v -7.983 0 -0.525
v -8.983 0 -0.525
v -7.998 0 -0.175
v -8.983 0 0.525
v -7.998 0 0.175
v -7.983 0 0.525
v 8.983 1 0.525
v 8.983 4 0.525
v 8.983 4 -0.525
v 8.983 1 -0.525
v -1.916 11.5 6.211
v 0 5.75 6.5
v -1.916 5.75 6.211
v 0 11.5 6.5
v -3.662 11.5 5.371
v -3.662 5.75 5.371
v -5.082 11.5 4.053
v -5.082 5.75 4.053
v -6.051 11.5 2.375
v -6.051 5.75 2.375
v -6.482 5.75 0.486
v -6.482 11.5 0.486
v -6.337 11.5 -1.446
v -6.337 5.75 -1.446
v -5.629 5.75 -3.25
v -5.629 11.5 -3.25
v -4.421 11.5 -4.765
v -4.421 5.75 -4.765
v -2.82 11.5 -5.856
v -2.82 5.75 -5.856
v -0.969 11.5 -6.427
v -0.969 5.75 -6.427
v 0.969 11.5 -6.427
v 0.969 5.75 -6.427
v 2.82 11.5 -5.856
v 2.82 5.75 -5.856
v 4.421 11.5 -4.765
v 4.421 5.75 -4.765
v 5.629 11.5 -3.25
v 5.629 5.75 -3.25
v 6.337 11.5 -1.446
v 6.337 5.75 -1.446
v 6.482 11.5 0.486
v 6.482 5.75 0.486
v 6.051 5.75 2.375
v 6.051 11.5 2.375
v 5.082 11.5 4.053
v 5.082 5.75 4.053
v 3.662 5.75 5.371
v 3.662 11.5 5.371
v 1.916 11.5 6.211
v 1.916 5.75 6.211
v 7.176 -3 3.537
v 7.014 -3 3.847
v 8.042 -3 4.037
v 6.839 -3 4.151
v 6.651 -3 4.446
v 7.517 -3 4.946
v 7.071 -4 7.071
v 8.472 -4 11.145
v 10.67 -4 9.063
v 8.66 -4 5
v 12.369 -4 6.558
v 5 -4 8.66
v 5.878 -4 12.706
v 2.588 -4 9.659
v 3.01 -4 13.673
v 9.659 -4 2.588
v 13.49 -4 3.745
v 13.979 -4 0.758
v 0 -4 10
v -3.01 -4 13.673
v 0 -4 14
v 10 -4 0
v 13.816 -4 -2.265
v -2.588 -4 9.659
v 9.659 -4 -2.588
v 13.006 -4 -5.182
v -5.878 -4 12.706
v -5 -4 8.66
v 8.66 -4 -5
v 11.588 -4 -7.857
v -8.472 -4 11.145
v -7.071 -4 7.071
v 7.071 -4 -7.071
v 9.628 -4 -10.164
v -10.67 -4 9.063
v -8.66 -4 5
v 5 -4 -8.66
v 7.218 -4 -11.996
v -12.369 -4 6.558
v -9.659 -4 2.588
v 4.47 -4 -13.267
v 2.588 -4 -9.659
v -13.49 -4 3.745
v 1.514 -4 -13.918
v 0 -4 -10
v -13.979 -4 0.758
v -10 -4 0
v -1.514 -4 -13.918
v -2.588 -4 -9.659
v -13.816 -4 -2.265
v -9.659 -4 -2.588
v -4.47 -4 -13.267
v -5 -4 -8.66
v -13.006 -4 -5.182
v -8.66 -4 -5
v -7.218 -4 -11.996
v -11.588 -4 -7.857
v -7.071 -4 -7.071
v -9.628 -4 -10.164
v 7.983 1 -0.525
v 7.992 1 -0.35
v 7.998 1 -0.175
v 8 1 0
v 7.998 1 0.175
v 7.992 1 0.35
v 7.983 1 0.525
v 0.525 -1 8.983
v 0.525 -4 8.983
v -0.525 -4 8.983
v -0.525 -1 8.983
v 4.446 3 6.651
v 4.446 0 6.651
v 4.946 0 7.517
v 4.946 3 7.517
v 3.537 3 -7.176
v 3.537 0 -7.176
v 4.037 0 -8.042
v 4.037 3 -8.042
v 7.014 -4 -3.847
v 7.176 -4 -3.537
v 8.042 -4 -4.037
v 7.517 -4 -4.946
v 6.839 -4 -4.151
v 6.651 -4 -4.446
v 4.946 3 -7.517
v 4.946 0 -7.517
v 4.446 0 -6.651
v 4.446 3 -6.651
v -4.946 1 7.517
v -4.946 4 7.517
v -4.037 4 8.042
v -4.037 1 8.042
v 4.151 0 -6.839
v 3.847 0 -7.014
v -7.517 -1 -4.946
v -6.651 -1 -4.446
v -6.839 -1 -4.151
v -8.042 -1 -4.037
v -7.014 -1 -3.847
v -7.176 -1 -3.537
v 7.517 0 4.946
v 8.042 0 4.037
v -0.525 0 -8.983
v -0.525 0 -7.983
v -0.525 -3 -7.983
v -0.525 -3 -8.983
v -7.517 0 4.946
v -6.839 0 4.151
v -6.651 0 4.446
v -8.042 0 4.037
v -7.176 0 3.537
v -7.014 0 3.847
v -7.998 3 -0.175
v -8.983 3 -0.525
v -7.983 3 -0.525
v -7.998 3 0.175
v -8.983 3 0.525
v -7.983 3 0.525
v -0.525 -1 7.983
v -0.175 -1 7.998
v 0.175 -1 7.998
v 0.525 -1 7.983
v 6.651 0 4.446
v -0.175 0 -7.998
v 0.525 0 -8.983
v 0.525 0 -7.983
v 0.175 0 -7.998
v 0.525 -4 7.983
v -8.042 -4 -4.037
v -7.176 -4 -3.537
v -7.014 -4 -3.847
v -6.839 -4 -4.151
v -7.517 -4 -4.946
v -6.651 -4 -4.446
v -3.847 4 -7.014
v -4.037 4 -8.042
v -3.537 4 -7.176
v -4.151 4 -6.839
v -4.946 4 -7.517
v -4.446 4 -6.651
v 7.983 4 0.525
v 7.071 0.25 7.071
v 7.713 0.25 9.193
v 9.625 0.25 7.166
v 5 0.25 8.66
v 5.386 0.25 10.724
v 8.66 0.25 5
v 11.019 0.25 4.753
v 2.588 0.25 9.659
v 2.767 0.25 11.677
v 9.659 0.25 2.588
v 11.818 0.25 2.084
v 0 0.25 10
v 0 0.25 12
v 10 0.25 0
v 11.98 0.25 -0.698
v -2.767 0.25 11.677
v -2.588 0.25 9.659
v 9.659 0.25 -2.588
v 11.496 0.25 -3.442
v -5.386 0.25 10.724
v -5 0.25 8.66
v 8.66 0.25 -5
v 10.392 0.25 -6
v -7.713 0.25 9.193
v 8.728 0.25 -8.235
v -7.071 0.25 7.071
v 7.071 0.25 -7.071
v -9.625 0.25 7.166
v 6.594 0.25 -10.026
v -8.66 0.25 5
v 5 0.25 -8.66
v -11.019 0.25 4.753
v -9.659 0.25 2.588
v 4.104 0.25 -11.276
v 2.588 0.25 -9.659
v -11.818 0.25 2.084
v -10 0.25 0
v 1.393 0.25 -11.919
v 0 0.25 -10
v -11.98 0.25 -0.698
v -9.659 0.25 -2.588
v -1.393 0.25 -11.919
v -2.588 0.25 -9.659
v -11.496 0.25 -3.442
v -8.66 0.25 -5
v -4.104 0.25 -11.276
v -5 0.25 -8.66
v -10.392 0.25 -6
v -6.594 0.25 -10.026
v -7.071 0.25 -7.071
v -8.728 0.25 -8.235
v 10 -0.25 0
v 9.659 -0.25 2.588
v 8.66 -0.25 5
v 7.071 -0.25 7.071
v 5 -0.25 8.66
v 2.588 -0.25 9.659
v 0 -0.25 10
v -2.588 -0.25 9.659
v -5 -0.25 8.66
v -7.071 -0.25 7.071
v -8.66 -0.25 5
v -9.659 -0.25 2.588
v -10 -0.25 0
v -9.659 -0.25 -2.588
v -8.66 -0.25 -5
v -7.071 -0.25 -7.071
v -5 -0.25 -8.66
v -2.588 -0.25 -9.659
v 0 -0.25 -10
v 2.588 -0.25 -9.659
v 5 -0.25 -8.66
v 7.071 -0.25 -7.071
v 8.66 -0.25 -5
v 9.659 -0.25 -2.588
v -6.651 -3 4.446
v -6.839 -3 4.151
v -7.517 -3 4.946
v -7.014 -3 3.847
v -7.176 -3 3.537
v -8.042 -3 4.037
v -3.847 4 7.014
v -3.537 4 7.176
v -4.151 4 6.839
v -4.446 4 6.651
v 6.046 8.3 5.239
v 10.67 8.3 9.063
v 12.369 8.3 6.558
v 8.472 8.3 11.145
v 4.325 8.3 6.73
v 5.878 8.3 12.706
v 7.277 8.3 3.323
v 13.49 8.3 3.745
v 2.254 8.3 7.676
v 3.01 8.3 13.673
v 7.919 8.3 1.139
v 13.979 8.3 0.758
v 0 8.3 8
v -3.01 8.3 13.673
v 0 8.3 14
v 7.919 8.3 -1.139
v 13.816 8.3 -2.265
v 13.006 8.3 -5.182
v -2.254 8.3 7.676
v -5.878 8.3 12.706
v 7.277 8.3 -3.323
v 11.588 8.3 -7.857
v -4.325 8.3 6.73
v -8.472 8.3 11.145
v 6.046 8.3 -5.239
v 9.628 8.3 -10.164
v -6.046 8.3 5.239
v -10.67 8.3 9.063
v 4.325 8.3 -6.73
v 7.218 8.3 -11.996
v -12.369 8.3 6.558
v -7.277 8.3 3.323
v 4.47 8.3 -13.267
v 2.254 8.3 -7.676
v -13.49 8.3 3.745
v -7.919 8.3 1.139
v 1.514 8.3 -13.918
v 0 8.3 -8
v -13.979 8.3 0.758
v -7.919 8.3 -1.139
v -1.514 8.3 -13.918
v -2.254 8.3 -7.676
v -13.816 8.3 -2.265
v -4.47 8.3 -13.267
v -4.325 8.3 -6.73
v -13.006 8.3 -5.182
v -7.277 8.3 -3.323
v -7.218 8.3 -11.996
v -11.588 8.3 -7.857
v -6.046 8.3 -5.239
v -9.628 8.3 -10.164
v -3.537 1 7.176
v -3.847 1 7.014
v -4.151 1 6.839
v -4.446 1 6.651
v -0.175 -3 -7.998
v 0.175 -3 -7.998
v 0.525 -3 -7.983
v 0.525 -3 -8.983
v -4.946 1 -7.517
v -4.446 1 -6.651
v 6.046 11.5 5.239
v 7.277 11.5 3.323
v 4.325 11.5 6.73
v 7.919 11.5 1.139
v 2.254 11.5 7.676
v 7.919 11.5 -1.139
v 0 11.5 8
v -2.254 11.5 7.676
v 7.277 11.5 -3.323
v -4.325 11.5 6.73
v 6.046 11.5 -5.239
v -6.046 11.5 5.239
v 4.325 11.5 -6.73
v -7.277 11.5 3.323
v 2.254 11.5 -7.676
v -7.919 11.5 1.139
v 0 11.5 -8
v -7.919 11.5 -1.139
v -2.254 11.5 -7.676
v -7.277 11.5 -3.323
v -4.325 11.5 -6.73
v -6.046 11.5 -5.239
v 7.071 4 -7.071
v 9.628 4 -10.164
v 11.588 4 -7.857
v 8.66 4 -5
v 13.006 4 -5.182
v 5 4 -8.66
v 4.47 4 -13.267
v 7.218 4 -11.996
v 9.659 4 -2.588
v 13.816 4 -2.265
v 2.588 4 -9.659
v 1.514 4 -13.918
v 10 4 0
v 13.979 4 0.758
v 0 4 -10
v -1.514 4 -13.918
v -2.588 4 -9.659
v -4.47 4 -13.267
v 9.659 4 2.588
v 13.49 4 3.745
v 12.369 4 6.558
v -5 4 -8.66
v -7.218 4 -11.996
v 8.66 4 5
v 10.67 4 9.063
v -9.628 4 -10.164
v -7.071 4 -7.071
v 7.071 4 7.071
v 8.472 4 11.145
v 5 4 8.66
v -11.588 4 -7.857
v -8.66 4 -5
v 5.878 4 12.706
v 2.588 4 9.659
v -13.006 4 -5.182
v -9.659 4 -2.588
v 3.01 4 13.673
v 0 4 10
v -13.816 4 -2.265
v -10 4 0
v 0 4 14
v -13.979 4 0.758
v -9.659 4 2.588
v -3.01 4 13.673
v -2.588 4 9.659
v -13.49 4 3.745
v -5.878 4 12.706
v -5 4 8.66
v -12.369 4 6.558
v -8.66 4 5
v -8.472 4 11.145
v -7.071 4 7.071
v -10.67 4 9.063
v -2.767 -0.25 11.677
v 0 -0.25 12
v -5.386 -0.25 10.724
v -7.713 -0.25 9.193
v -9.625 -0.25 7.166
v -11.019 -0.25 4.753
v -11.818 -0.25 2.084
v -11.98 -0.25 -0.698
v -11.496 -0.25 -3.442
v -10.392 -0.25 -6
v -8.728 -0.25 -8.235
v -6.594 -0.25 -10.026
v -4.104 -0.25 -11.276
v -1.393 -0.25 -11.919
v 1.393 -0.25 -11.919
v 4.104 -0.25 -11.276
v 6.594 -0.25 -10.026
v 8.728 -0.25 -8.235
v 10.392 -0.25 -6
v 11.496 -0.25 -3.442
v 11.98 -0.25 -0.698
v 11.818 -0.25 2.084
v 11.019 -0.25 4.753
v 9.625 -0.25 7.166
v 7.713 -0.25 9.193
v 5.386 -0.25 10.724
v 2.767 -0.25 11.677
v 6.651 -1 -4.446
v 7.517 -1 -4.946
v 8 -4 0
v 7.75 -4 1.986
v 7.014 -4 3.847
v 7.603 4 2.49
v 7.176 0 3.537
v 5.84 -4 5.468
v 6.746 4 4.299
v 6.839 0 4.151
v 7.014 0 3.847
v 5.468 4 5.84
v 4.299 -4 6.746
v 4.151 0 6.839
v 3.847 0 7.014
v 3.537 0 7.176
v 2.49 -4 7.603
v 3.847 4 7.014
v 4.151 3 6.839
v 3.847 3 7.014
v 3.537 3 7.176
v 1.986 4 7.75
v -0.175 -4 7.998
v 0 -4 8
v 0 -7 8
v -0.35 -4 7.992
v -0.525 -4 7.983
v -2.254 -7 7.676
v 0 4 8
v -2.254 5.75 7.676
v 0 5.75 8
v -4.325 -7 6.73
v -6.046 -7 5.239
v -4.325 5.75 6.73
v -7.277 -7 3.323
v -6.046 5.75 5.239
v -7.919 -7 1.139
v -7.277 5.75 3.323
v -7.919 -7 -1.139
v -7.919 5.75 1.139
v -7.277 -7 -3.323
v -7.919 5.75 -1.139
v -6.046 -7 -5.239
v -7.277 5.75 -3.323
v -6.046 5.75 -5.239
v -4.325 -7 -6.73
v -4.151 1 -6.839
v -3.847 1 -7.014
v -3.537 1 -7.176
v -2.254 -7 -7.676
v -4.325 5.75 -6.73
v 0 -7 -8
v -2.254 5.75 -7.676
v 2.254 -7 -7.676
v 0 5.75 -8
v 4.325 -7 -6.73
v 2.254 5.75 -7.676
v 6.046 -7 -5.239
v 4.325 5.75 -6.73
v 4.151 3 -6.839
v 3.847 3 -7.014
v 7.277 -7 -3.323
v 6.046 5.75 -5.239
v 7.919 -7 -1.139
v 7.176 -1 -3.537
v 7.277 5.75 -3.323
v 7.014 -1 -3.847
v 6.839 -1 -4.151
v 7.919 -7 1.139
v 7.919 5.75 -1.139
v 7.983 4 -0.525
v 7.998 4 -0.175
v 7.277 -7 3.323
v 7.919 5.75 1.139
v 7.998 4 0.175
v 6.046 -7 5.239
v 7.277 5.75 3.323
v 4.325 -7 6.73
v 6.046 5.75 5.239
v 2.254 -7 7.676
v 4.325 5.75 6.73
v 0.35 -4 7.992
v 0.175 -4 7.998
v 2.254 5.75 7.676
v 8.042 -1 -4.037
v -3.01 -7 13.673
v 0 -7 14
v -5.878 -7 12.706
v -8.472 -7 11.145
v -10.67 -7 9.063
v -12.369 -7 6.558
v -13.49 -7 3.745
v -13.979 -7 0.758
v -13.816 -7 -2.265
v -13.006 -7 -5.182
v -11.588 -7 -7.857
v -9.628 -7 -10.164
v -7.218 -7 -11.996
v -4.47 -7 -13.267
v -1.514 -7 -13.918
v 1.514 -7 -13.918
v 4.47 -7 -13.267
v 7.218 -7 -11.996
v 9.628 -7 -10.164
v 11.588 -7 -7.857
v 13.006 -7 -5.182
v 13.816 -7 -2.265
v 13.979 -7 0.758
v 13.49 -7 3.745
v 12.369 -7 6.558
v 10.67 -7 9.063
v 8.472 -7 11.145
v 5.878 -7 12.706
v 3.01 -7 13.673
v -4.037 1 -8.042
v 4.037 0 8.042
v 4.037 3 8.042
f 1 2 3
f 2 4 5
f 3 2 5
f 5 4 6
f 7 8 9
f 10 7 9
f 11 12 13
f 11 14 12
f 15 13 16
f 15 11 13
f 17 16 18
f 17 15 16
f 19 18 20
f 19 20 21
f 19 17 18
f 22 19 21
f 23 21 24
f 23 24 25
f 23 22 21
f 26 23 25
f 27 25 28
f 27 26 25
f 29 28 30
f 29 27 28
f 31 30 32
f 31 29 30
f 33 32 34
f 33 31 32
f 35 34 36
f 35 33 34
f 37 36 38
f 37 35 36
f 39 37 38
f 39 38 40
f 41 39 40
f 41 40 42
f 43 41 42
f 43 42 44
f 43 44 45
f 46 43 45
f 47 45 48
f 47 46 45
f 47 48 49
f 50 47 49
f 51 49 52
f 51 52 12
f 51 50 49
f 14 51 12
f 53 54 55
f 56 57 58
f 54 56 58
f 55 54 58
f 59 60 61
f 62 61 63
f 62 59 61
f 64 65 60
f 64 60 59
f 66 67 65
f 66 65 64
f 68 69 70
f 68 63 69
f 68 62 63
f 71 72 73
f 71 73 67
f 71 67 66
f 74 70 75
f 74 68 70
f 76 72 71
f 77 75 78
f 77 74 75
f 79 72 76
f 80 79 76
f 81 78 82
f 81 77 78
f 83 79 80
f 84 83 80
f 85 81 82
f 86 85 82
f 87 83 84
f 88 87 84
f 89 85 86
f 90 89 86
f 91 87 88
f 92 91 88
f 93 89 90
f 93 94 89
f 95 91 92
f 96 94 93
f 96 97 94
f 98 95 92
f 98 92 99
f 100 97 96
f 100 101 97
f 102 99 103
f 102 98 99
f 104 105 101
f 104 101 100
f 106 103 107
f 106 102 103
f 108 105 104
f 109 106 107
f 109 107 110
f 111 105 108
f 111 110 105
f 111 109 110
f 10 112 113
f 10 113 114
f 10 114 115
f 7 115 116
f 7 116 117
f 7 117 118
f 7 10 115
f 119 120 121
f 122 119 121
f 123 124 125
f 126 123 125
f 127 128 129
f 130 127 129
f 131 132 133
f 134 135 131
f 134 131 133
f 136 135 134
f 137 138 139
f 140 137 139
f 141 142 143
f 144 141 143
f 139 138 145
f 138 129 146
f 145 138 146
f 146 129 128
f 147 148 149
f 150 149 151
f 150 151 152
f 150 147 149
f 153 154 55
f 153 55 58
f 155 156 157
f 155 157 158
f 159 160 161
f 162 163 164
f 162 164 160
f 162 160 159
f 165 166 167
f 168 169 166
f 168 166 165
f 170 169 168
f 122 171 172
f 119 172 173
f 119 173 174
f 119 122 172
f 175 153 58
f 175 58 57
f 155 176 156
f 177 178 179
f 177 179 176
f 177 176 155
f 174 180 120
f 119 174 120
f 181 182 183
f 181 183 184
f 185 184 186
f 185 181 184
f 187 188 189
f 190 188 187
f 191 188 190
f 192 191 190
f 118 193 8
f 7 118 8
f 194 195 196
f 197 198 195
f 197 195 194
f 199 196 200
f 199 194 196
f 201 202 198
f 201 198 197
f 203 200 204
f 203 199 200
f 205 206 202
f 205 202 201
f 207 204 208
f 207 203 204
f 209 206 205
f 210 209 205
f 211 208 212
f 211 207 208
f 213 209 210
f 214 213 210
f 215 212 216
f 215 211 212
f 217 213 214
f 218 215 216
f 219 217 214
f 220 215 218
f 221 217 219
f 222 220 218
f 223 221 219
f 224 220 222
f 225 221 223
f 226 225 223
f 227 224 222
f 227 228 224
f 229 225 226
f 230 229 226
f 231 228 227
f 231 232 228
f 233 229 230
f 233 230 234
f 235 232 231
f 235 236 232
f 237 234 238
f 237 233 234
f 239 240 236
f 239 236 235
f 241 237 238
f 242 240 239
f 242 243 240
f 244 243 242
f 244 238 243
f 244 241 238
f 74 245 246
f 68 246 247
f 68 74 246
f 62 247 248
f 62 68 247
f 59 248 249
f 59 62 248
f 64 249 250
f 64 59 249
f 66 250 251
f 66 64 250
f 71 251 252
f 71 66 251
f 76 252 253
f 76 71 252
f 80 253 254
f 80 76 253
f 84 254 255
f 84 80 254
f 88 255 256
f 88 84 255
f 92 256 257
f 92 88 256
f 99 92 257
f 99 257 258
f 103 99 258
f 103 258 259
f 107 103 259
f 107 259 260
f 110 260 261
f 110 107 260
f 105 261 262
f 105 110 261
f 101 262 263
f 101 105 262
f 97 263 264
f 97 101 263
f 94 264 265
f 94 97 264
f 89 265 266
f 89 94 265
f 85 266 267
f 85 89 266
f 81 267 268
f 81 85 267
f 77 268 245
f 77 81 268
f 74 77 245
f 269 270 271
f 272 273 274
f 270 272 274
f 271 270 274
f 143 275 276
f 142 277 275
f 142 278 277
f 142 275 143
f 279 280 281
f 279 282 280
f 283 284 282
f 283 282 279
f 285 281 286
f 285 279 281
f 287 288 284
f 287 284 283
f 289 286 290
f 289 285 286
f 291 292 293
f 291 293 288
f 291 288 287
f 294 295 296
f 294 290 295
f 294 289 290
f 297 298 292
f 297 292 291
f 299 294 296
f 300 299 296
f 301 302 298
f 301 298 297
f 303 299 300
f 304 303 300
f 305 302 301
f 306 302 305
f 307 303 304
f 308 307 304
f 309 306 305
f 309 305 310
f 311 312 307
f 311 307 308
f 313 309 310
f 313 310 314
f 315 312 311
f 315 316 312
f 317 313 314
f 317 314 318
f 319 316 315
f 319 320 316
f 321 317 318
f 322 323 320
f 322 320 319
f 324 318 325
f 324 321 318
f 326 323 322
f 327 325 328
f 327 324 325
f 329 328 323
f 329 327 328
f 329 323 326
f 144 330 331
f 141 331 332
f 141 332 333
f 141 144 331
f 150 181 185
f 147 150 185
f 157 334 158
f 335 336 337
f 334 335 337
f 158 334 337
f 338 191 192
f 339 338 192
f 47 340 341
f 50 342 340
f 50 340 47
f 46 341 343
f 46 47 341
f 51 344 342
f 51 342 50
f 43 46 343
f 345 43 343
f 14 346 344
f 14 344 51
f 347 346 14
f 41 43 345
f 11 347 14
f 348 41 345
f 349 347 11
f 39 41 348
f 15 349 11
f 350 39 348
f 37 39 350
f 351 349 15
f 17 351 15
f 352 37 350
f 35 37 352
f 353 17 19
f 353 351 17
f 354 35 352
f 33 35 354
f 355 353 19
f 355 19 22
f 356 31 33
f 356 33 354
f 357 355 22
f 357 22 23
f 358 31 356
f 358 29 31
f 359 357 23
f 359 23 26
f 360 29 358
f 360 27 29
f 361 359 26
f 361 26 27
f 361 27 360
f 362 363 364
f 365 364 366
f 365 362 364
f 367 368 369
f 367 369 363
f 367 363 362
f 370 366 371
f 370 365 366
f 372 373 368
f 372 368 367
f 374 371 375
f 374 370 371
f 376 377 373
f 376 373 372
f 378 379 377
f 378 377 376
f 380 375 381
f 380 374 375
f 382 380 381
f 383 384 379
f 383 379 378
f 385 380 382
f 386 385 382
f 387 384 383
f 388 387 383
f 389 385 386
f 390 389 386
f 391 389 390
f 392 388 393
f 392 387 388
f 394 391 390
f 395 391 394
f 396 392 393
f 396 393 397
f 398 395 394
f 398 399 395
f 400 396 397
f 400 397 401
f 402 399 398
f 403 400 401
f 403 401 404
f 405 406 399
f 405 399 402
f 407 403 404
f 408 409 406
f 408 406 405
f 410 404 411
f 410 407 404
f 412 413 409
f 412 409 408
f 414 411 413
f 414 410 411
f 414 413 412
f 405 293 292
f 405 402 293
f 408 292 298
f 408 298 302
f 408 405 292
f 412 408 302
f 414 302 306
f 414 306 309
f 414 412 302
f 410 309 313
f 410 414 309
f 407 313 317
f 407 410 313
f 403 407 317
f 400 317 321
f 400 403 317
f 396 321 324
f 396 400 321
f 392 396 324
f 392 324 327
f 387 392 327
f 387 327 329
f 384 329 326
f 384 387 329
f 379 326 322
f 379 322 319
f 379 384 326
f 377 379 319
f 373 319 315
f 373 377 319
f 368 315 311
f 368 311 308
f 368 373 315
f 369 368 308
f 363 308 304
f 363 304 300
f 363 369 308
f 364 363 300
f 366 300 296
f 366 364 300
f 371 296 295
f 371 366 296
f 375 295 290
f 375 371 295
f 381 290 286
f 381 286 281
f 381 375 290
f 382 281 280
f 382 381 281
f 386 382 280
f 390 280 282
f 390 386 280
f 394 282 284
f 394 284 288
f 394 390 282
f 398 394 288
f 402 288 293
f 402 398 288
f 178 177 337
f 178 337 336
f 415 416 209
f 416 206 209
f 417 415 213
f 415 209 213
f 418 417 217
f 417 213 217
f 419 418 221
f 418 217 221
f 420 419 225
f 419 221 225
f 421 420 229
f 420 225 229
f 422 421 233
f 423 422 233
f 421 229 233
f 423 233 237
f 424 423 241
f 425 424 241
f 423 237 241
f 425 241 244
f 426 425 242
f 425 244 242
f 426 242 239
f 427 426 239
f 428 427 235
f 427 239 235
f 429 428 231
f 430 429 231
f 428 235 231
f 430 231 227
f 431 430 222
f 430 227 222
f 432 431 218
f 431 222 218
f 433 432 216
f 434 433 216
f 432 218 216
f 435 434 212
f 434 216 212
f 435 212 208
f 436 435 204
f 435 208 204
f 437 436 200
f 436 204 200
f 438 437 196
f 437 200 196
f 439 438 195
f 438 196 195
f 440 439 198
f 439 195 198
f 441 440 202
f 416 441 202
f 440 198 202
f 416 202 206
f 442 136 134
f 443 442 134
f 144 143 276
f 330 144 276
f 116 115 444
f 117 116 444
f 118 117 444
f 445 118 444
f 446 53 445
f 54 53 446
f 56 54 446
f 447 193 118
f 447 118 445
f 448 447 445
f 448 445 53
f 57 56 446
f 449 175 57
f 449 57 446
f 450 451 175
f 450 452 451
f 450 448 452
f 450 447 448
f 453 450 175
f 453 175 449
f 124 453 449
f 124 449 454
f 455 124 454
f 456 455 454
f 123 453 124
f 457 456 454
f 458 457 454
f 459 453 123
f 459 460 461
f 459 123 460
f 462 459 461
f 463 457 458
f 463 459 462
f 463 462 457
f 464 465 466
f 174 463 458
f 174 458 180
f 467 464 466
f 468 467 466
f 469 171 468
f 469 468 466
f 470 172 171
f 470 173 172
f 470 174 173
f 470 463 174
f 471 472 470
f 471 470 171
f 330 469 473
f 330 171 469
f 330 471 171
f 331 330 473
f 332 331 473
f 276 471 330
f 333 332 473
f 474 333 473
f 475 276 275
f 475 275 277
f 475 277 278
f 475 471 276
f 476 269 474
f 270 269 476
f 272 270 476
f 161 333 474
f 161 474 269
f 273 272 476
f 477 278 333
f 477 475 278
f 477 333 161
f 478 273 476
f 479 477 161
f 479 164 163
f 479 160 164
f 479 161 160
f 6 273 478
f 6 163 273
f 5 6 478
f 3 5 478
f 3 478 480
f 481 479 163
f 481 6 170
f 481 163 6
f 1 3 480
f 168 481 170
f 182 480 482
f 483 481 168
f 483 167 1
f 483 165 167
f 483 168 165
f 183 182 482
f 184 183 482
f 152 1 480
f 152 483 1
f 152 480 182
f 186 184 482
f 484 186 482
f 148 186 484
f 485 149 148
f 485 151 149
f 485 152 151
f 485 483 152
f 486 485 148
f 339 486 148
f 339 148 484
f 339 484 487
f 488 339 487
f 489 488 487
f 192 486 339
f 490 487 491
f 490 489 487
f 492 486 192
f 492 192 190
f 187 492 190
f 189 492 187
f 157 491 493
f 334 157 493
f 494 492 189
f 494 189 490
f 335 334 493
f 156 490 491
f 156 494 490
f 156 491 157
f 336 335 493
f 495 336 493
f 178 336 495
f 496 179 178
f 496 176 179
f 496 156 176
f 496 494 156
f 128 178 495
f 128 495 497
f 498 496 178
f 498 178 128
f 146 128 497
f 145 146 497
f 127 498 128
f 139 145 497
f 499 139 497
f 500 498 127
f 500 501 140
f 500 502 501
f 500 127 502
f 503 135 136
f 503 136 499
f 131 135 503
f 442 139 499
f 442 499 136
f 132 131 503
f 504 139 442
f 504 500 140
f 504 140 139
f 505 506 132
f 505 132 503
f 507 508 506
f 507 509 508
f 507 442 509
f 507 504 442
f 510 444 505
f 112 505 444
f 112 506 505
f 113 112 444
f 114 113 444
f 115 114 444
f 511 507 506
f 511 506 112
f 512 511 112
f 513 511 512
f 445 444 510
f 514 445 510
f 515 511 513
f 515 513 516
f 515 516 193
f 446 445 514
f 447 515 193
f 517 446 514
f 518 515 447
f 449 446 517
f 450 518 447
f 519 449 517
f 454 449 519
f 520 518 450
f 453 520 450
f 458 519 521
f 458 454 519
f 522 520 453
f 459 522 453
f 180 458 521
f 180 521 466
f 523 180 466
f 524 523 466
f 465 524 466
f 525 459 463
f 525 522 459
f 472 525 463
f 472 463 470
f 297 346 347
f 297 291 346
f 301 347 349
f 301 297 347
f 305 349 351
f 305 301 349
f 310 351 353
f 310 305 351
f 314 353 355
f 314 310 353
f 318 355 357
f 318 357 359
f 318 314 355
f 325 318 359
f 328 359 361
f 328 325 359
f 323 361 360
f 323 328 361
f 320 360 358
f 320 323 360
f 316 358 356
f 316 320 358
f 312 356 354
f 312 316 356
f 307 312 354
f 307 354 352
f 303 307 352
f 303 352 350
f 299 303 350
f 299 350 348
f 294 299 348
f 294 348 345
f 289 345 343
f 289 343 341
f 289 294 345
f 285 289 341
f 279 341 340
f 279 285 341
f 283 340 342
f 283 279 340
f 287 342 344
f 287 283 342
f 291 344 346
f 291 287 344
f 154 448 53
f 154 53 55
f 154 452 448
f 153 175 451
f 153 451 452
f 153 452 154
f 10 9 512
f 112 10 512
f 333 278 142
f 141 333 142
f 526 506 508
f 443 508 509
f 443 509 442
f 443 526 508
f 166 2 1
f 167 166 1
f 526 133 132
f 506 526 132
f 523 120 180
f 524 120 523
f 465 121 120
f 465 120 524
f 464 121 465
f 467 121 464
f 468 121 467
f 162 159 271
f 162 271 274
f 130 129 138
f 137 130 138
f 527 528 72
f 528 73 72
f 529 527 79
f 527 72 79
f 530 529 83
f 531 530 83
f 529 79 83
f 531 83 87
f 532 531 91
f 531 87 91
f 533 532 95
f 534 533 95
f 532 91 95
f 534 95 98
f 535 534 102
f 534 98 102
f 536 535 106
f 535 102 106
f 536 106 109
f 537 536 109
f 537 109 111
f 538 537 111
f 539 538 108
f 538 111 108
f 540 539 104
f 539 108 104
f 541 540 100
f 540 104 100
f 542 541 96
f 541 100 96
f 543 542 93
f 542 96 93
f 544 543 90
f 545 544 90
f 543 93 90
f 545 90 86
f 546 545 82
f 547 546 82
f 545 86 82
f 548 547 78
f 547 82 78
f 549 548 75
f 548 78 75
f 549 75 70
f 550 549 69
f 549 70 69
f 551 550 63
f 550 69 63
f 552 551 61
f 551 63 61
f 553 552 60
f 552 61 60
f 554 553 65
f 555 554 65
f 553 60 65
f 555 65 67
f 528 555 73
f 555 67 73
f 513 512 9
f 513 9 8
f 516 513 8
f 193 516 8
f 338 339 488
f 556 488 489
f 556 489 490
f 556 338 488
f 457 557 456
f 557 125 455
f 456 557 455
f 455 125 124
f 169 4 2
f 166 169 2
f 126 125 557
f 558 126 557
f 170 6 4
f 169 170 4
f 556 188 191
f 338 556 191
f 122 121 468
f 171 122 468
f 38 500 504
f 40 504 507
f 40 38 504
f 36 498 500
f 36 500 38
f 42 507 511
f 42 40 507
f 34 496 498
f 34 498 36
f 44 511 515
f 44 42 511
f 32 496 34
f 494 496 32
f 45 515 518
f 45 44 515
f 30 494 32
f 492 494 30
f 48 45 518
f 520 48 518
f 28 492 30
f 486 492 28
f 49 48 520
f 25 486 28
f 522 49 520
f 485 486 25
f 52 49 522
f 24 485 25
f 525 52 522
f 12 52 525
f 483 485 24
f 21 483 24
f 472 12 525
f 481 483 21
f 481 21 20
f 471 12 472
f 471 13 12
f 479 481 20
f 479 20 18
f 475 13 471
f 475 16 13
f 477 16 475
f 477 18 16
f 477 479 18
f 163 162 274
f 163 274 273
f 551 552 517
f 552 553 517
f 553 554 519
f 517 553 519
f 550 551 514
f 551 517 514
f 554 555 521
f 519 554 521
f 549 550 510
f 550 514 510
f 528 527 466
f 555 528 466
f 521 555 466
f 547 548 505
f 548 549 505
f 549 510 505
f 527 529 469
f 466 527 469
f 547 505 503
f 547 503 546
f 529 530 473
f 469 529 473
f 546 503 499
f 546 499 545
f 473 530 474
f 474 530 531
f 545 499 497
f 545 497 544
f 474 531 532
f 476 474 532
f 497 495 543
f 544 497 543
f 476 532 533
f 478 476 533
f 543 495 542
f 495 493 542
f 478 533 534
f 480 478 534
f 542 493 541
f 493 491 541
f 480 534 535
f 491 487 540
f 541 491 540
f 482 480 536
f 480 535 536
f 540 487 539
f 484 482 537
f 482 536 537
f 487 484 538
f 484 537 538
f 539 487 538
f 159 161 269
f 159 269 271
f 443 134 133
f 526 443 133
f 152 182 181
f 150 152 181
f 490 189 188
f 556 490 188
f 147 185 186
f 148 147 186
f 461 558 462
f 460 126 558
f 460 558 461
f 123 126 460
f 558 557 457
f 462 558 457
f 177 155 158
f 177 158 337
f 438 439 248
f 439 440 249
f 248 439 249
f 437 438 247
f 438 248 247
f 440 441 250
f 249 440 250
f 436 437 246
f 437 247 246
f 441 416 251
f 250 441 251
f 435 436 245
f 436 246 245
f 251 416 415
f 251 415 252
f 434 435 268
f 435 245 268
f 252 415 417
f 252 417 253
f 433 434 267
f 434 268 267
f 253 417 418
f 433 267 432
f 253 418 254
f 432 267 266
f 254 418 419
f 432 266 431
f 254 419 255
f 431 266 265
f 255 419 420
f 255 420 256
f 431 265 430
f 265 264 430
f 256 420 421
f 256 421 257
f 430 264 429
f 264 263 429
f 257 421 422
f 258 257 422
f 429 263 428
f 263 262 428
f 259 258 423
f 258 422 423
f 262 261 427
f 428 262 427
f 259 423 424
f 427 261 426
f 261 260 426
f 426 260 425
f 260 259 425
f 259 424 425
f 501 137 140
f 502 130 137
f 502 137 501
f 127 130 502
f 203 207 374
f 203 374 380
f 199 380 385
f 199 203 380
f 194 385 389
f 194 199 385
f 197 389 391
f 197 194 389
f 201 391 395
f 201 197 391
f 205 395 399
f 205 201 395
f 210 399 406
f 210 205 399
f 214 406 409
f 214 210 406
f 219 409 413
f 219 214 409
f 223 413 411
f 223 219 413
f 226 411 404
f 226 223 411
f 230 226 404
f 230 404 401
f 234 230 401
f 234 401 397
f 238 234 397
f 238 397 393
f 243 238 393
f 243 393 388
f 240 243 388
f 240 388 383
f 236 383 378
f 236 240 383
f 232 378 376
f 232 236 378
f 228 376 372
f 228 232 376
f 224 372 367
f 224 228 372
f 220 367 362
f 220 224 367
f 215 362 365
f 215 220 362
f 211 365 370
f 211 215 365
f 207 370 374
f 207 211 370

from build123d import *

# Parameters (mm, degrees)
F0_R            = 10
F0_R_2          = 8
F1_DEPTH        = 4
F3_DEPTH        = 3
F3_COPIES_COUNT = 3
F5_DEPTH        = 3
F5_COPIES_COUNT = 3
F7_DEPTH        = 3
F7_COPIES_COUNT = 3
F9_DEPTH        = 3
F9_COPIES_COUNT = 3
F10_W           = 0.5
F10_H           = 2
F10_W_2         = 3
F10_H_2         = 6


# Not quite as in the source:
# - a pattern or mirror of a feature is missing from the dataset's text; its kind, count and spacing are read off the source's solid


with BuildPart() as f1:
    # F0 (on Front) → F1 (new body, symmetric)
    with BuildSketch(Plane.XZ):
        Circle(F0_R)
        Circle(F0_R_2, mode=Mode.SUBTRACT)
    extrude(amount=F1_DEPTH, both=True)

    # F2 (on face) → F3 (cut)
    with BuildSketch(Plane.XZ.offset(4)):
        with BuildLine():
            Line((-0.525, 8.9827548503), (-0.525, 7.9827548503))
            ThreePointArc((-0.525, 7.9827548503), (0, 8), (0.525, 7.9827548503))
            Line((0.525, 7.9827548503), (0.525, 8.9827548503))
            Line((0.525, 8.9827548503), (-0.525, 8.9827548503))
        make_face()
    f3 = extrude(amount=-F3_DEPTH, mode=Mode.SUBTRACT)

    # F3_copies: F3 ×3 about axis
    f3_copies_axis = Axis((0, 0, 0), (0, 1, 0))
    for i in range(1, F3_COPIES_COUNT):
        add(f3.rotate(f3_copies_axis, i * 360 / F3_COPIES_COUNT), mode=Mode.SUBTRACT)

    # F4 (on Front) → F5 (cut)
    with BuildSketch(Plane.XZ):
        with BuildLine():
            ThreePointArc((6.6507684925, 4.4460407621), (6.9282032303, 4), (7.1757684925, 3.5367140882))
            Line((7.1757684925, 3.5367140882), (8.0417938963, 4.0367140882))
            Line((8.0417938963, 4.0367140882), (7.5167938963, 4.9460407621))
            Line((7.5167938963, 4.9460407621), (6.6507684925, 4.4460407621))
        make_face()
    f5 = extrude(amount=F5_DEPTH, mode=Mode.SUBTRACT)

    # F5_copies: F5 ×3 about axis
    f5_copies_axis = Axis((0, 0, 0), (0, 1, 0))
    for i in range(1, F5_COPIES_COUNT):
        add(f5.rotate(f5_copies_axis, i * 360 / F5_COPIES_COUNT), mode=Mode.SUBTRACT)

    # F6 (on face) → F7 (cut)
    with BuildSketch(Plane(origin=(0, 4, 0), x_dir=(-1, 0, 0), z_dir=(0, 1, 0))):
        with BuildLine():
            ThreePointArc((3.5367140882, 7.1757684925), (4, 6.9282032303), (4.4460407621, 6.6507684925))
            Line((4.4460407621, 6.6507684925), (4.9460407621, 7.5167938963))
            Line((4.9460407621, 7.5167938963), (4.0367140882, 8.0417938963))
            Line((4.0367140882, 8.0417938963), (3.5367140882, 7.1757684925))
        make_face()
    f7 = extrude(amount=-F7_DEPTH, mode=Mode.SUBTRACT)

    # F7_copies: F7 ×3 about axis
    f7_copies_axis = Axis((0, 0, 0), (0, 1, 0))
    for i in range(1, F7_COPIES_COUNT):
        add(f7.rotate(f7_copies_axis, i * 360 / F7_COPIES_COUNT), mode=Mode.SUBTRACT)

    # F8 (on Front) → F9 (cut)
    with BuildSketch(Plane.XZ):
        with BuildLine():
            ThreePointArc((-7.9827548503, -0.525), (-8, 0), (-7.9827548503, 0.525))
            Line((-7.9827548503, 0.525), (-8.9827548503, 0.525))
            Line((-8.9827548503, 0.525), (-8.9827548503, -0.525))
            Line((-8.9827548503, -0.525), (-7.9827548503, -0.525))
        make_face()
    f9 = extrude(amount=-F9_DEPTH, mode=Mode.SUBTRACT)

    # F9_copies: F9 ×3 about axis
    f9_copies_axis = Axis((0, 0, 0), (0, 1, 0))
    for i in range(1, F9_COPIES_COUNT):
        add(f9.rotate(f9_copies_axis, i * 360 / F9_COPIES_COUNT), mode=Mode.SUBTRACT)

    # F10 (on Right) → F11 (revolve)
    with BuildSketch(Plane.YZ):
        Polygon((4, 14), (4, 8), (5.75, 8), (5.75, 6.5), (11.5, 6.5), (11.5, 8), (8.3, 8), (8.3, 14), align=None)
        with Locations((0, 11)):
            Rectangle(F10_W, F10_H)
        with Locations((-5.5, 11)):
            Rectangle(F10_W_2, F10_H_2)
    revolve(axis=Axis((0, 0, 0), (0, -1, 0)))


solid = f1.part
